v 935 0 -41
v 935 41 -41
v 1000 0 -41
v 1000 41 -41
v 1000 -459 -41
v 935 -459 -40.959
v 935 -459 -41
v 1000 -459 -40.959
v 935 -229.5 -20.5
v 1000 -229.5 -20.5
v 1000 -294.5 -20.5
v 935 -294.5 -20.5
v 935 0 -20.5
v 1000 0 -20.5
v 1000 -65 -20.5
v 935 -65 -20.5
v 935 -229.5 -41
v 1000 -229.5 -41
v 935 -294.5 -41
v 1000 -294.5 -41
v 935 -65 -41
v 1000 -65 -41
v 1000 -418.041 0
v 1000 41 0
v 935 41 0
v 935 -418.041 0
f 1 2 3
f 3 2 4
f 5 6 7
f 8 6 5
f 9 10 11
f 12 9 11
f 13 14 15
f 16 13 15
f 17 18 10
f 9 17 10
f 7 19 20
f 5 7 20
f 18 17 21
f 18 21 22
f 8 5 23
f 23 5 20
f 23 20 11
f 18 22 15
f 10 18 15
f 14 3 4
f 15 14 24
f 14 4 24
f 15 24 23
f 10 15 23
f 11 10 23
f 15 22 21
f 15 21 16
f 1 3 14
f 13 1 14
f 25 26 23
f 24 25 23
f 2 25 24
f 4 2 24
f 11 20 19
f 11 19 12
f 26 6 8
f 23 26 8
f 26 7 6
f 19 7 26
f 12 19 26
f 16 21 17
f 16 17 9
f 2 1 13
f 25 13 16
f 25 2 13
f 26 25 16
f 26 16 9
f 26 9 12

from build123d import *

# Parameters (mm, degrees)
SKETCH001_W     = 65
SKETCH001_H     = 41
PAD001_DEPTH    = 500
CHAMFER_SIZE    = 40.959
SKETCH004_W     = 20.5
SKETCH004_H     = 65
POCKET001_DEPTH = 65.001


with BuildPart() as part:
    # Sketch001 → Pad001 (new body)
    with BuildSketch(Plane.XZ.offset(-41)):
        with Locations((32.5, -20.5)):
            Rectangle(SKETCH001_W, SKETCH001_H)
    extrude(amount=PAD001_DEPTH)

    # Chamfer
    chamfer_edges = [part.edges().sort_by_distance(p)[0] for p in [
        (32.5, -459, 0),
    ]]
    chamfer(chamfer_edges, length=CHAMFER_SIZE)

    # Sketch004 (on Face5 of Chamfer) → Pocket001 (cut, through all)
    with BuildSketch(Plane(origin=(65, 0, 0), x_dir=(0, 0, 1), z_dir=(1, 0, 0))):
        with Locations((-30.75, 32.5)):
            Rectangle(SKETCH004_W, SKETCH004_H)
        with Locations((-30.75, 262)):
            Rectangle(SKETCH004_W, SKETCH004_H)
    extrude(amount=-POCKET001_DEPTH, mode=Mode.SUBTRACT)


with BuildPart() as part_1:
    # Clone005 placement: moved
    add(part.part.moved(Location((467.5, 0, 0))))


with BuildPart() as part_2:
    # Clone009 placement: moved
    add(part_1.part.moved(Location((467.5, 0, 0))))


solid = part_2.part
